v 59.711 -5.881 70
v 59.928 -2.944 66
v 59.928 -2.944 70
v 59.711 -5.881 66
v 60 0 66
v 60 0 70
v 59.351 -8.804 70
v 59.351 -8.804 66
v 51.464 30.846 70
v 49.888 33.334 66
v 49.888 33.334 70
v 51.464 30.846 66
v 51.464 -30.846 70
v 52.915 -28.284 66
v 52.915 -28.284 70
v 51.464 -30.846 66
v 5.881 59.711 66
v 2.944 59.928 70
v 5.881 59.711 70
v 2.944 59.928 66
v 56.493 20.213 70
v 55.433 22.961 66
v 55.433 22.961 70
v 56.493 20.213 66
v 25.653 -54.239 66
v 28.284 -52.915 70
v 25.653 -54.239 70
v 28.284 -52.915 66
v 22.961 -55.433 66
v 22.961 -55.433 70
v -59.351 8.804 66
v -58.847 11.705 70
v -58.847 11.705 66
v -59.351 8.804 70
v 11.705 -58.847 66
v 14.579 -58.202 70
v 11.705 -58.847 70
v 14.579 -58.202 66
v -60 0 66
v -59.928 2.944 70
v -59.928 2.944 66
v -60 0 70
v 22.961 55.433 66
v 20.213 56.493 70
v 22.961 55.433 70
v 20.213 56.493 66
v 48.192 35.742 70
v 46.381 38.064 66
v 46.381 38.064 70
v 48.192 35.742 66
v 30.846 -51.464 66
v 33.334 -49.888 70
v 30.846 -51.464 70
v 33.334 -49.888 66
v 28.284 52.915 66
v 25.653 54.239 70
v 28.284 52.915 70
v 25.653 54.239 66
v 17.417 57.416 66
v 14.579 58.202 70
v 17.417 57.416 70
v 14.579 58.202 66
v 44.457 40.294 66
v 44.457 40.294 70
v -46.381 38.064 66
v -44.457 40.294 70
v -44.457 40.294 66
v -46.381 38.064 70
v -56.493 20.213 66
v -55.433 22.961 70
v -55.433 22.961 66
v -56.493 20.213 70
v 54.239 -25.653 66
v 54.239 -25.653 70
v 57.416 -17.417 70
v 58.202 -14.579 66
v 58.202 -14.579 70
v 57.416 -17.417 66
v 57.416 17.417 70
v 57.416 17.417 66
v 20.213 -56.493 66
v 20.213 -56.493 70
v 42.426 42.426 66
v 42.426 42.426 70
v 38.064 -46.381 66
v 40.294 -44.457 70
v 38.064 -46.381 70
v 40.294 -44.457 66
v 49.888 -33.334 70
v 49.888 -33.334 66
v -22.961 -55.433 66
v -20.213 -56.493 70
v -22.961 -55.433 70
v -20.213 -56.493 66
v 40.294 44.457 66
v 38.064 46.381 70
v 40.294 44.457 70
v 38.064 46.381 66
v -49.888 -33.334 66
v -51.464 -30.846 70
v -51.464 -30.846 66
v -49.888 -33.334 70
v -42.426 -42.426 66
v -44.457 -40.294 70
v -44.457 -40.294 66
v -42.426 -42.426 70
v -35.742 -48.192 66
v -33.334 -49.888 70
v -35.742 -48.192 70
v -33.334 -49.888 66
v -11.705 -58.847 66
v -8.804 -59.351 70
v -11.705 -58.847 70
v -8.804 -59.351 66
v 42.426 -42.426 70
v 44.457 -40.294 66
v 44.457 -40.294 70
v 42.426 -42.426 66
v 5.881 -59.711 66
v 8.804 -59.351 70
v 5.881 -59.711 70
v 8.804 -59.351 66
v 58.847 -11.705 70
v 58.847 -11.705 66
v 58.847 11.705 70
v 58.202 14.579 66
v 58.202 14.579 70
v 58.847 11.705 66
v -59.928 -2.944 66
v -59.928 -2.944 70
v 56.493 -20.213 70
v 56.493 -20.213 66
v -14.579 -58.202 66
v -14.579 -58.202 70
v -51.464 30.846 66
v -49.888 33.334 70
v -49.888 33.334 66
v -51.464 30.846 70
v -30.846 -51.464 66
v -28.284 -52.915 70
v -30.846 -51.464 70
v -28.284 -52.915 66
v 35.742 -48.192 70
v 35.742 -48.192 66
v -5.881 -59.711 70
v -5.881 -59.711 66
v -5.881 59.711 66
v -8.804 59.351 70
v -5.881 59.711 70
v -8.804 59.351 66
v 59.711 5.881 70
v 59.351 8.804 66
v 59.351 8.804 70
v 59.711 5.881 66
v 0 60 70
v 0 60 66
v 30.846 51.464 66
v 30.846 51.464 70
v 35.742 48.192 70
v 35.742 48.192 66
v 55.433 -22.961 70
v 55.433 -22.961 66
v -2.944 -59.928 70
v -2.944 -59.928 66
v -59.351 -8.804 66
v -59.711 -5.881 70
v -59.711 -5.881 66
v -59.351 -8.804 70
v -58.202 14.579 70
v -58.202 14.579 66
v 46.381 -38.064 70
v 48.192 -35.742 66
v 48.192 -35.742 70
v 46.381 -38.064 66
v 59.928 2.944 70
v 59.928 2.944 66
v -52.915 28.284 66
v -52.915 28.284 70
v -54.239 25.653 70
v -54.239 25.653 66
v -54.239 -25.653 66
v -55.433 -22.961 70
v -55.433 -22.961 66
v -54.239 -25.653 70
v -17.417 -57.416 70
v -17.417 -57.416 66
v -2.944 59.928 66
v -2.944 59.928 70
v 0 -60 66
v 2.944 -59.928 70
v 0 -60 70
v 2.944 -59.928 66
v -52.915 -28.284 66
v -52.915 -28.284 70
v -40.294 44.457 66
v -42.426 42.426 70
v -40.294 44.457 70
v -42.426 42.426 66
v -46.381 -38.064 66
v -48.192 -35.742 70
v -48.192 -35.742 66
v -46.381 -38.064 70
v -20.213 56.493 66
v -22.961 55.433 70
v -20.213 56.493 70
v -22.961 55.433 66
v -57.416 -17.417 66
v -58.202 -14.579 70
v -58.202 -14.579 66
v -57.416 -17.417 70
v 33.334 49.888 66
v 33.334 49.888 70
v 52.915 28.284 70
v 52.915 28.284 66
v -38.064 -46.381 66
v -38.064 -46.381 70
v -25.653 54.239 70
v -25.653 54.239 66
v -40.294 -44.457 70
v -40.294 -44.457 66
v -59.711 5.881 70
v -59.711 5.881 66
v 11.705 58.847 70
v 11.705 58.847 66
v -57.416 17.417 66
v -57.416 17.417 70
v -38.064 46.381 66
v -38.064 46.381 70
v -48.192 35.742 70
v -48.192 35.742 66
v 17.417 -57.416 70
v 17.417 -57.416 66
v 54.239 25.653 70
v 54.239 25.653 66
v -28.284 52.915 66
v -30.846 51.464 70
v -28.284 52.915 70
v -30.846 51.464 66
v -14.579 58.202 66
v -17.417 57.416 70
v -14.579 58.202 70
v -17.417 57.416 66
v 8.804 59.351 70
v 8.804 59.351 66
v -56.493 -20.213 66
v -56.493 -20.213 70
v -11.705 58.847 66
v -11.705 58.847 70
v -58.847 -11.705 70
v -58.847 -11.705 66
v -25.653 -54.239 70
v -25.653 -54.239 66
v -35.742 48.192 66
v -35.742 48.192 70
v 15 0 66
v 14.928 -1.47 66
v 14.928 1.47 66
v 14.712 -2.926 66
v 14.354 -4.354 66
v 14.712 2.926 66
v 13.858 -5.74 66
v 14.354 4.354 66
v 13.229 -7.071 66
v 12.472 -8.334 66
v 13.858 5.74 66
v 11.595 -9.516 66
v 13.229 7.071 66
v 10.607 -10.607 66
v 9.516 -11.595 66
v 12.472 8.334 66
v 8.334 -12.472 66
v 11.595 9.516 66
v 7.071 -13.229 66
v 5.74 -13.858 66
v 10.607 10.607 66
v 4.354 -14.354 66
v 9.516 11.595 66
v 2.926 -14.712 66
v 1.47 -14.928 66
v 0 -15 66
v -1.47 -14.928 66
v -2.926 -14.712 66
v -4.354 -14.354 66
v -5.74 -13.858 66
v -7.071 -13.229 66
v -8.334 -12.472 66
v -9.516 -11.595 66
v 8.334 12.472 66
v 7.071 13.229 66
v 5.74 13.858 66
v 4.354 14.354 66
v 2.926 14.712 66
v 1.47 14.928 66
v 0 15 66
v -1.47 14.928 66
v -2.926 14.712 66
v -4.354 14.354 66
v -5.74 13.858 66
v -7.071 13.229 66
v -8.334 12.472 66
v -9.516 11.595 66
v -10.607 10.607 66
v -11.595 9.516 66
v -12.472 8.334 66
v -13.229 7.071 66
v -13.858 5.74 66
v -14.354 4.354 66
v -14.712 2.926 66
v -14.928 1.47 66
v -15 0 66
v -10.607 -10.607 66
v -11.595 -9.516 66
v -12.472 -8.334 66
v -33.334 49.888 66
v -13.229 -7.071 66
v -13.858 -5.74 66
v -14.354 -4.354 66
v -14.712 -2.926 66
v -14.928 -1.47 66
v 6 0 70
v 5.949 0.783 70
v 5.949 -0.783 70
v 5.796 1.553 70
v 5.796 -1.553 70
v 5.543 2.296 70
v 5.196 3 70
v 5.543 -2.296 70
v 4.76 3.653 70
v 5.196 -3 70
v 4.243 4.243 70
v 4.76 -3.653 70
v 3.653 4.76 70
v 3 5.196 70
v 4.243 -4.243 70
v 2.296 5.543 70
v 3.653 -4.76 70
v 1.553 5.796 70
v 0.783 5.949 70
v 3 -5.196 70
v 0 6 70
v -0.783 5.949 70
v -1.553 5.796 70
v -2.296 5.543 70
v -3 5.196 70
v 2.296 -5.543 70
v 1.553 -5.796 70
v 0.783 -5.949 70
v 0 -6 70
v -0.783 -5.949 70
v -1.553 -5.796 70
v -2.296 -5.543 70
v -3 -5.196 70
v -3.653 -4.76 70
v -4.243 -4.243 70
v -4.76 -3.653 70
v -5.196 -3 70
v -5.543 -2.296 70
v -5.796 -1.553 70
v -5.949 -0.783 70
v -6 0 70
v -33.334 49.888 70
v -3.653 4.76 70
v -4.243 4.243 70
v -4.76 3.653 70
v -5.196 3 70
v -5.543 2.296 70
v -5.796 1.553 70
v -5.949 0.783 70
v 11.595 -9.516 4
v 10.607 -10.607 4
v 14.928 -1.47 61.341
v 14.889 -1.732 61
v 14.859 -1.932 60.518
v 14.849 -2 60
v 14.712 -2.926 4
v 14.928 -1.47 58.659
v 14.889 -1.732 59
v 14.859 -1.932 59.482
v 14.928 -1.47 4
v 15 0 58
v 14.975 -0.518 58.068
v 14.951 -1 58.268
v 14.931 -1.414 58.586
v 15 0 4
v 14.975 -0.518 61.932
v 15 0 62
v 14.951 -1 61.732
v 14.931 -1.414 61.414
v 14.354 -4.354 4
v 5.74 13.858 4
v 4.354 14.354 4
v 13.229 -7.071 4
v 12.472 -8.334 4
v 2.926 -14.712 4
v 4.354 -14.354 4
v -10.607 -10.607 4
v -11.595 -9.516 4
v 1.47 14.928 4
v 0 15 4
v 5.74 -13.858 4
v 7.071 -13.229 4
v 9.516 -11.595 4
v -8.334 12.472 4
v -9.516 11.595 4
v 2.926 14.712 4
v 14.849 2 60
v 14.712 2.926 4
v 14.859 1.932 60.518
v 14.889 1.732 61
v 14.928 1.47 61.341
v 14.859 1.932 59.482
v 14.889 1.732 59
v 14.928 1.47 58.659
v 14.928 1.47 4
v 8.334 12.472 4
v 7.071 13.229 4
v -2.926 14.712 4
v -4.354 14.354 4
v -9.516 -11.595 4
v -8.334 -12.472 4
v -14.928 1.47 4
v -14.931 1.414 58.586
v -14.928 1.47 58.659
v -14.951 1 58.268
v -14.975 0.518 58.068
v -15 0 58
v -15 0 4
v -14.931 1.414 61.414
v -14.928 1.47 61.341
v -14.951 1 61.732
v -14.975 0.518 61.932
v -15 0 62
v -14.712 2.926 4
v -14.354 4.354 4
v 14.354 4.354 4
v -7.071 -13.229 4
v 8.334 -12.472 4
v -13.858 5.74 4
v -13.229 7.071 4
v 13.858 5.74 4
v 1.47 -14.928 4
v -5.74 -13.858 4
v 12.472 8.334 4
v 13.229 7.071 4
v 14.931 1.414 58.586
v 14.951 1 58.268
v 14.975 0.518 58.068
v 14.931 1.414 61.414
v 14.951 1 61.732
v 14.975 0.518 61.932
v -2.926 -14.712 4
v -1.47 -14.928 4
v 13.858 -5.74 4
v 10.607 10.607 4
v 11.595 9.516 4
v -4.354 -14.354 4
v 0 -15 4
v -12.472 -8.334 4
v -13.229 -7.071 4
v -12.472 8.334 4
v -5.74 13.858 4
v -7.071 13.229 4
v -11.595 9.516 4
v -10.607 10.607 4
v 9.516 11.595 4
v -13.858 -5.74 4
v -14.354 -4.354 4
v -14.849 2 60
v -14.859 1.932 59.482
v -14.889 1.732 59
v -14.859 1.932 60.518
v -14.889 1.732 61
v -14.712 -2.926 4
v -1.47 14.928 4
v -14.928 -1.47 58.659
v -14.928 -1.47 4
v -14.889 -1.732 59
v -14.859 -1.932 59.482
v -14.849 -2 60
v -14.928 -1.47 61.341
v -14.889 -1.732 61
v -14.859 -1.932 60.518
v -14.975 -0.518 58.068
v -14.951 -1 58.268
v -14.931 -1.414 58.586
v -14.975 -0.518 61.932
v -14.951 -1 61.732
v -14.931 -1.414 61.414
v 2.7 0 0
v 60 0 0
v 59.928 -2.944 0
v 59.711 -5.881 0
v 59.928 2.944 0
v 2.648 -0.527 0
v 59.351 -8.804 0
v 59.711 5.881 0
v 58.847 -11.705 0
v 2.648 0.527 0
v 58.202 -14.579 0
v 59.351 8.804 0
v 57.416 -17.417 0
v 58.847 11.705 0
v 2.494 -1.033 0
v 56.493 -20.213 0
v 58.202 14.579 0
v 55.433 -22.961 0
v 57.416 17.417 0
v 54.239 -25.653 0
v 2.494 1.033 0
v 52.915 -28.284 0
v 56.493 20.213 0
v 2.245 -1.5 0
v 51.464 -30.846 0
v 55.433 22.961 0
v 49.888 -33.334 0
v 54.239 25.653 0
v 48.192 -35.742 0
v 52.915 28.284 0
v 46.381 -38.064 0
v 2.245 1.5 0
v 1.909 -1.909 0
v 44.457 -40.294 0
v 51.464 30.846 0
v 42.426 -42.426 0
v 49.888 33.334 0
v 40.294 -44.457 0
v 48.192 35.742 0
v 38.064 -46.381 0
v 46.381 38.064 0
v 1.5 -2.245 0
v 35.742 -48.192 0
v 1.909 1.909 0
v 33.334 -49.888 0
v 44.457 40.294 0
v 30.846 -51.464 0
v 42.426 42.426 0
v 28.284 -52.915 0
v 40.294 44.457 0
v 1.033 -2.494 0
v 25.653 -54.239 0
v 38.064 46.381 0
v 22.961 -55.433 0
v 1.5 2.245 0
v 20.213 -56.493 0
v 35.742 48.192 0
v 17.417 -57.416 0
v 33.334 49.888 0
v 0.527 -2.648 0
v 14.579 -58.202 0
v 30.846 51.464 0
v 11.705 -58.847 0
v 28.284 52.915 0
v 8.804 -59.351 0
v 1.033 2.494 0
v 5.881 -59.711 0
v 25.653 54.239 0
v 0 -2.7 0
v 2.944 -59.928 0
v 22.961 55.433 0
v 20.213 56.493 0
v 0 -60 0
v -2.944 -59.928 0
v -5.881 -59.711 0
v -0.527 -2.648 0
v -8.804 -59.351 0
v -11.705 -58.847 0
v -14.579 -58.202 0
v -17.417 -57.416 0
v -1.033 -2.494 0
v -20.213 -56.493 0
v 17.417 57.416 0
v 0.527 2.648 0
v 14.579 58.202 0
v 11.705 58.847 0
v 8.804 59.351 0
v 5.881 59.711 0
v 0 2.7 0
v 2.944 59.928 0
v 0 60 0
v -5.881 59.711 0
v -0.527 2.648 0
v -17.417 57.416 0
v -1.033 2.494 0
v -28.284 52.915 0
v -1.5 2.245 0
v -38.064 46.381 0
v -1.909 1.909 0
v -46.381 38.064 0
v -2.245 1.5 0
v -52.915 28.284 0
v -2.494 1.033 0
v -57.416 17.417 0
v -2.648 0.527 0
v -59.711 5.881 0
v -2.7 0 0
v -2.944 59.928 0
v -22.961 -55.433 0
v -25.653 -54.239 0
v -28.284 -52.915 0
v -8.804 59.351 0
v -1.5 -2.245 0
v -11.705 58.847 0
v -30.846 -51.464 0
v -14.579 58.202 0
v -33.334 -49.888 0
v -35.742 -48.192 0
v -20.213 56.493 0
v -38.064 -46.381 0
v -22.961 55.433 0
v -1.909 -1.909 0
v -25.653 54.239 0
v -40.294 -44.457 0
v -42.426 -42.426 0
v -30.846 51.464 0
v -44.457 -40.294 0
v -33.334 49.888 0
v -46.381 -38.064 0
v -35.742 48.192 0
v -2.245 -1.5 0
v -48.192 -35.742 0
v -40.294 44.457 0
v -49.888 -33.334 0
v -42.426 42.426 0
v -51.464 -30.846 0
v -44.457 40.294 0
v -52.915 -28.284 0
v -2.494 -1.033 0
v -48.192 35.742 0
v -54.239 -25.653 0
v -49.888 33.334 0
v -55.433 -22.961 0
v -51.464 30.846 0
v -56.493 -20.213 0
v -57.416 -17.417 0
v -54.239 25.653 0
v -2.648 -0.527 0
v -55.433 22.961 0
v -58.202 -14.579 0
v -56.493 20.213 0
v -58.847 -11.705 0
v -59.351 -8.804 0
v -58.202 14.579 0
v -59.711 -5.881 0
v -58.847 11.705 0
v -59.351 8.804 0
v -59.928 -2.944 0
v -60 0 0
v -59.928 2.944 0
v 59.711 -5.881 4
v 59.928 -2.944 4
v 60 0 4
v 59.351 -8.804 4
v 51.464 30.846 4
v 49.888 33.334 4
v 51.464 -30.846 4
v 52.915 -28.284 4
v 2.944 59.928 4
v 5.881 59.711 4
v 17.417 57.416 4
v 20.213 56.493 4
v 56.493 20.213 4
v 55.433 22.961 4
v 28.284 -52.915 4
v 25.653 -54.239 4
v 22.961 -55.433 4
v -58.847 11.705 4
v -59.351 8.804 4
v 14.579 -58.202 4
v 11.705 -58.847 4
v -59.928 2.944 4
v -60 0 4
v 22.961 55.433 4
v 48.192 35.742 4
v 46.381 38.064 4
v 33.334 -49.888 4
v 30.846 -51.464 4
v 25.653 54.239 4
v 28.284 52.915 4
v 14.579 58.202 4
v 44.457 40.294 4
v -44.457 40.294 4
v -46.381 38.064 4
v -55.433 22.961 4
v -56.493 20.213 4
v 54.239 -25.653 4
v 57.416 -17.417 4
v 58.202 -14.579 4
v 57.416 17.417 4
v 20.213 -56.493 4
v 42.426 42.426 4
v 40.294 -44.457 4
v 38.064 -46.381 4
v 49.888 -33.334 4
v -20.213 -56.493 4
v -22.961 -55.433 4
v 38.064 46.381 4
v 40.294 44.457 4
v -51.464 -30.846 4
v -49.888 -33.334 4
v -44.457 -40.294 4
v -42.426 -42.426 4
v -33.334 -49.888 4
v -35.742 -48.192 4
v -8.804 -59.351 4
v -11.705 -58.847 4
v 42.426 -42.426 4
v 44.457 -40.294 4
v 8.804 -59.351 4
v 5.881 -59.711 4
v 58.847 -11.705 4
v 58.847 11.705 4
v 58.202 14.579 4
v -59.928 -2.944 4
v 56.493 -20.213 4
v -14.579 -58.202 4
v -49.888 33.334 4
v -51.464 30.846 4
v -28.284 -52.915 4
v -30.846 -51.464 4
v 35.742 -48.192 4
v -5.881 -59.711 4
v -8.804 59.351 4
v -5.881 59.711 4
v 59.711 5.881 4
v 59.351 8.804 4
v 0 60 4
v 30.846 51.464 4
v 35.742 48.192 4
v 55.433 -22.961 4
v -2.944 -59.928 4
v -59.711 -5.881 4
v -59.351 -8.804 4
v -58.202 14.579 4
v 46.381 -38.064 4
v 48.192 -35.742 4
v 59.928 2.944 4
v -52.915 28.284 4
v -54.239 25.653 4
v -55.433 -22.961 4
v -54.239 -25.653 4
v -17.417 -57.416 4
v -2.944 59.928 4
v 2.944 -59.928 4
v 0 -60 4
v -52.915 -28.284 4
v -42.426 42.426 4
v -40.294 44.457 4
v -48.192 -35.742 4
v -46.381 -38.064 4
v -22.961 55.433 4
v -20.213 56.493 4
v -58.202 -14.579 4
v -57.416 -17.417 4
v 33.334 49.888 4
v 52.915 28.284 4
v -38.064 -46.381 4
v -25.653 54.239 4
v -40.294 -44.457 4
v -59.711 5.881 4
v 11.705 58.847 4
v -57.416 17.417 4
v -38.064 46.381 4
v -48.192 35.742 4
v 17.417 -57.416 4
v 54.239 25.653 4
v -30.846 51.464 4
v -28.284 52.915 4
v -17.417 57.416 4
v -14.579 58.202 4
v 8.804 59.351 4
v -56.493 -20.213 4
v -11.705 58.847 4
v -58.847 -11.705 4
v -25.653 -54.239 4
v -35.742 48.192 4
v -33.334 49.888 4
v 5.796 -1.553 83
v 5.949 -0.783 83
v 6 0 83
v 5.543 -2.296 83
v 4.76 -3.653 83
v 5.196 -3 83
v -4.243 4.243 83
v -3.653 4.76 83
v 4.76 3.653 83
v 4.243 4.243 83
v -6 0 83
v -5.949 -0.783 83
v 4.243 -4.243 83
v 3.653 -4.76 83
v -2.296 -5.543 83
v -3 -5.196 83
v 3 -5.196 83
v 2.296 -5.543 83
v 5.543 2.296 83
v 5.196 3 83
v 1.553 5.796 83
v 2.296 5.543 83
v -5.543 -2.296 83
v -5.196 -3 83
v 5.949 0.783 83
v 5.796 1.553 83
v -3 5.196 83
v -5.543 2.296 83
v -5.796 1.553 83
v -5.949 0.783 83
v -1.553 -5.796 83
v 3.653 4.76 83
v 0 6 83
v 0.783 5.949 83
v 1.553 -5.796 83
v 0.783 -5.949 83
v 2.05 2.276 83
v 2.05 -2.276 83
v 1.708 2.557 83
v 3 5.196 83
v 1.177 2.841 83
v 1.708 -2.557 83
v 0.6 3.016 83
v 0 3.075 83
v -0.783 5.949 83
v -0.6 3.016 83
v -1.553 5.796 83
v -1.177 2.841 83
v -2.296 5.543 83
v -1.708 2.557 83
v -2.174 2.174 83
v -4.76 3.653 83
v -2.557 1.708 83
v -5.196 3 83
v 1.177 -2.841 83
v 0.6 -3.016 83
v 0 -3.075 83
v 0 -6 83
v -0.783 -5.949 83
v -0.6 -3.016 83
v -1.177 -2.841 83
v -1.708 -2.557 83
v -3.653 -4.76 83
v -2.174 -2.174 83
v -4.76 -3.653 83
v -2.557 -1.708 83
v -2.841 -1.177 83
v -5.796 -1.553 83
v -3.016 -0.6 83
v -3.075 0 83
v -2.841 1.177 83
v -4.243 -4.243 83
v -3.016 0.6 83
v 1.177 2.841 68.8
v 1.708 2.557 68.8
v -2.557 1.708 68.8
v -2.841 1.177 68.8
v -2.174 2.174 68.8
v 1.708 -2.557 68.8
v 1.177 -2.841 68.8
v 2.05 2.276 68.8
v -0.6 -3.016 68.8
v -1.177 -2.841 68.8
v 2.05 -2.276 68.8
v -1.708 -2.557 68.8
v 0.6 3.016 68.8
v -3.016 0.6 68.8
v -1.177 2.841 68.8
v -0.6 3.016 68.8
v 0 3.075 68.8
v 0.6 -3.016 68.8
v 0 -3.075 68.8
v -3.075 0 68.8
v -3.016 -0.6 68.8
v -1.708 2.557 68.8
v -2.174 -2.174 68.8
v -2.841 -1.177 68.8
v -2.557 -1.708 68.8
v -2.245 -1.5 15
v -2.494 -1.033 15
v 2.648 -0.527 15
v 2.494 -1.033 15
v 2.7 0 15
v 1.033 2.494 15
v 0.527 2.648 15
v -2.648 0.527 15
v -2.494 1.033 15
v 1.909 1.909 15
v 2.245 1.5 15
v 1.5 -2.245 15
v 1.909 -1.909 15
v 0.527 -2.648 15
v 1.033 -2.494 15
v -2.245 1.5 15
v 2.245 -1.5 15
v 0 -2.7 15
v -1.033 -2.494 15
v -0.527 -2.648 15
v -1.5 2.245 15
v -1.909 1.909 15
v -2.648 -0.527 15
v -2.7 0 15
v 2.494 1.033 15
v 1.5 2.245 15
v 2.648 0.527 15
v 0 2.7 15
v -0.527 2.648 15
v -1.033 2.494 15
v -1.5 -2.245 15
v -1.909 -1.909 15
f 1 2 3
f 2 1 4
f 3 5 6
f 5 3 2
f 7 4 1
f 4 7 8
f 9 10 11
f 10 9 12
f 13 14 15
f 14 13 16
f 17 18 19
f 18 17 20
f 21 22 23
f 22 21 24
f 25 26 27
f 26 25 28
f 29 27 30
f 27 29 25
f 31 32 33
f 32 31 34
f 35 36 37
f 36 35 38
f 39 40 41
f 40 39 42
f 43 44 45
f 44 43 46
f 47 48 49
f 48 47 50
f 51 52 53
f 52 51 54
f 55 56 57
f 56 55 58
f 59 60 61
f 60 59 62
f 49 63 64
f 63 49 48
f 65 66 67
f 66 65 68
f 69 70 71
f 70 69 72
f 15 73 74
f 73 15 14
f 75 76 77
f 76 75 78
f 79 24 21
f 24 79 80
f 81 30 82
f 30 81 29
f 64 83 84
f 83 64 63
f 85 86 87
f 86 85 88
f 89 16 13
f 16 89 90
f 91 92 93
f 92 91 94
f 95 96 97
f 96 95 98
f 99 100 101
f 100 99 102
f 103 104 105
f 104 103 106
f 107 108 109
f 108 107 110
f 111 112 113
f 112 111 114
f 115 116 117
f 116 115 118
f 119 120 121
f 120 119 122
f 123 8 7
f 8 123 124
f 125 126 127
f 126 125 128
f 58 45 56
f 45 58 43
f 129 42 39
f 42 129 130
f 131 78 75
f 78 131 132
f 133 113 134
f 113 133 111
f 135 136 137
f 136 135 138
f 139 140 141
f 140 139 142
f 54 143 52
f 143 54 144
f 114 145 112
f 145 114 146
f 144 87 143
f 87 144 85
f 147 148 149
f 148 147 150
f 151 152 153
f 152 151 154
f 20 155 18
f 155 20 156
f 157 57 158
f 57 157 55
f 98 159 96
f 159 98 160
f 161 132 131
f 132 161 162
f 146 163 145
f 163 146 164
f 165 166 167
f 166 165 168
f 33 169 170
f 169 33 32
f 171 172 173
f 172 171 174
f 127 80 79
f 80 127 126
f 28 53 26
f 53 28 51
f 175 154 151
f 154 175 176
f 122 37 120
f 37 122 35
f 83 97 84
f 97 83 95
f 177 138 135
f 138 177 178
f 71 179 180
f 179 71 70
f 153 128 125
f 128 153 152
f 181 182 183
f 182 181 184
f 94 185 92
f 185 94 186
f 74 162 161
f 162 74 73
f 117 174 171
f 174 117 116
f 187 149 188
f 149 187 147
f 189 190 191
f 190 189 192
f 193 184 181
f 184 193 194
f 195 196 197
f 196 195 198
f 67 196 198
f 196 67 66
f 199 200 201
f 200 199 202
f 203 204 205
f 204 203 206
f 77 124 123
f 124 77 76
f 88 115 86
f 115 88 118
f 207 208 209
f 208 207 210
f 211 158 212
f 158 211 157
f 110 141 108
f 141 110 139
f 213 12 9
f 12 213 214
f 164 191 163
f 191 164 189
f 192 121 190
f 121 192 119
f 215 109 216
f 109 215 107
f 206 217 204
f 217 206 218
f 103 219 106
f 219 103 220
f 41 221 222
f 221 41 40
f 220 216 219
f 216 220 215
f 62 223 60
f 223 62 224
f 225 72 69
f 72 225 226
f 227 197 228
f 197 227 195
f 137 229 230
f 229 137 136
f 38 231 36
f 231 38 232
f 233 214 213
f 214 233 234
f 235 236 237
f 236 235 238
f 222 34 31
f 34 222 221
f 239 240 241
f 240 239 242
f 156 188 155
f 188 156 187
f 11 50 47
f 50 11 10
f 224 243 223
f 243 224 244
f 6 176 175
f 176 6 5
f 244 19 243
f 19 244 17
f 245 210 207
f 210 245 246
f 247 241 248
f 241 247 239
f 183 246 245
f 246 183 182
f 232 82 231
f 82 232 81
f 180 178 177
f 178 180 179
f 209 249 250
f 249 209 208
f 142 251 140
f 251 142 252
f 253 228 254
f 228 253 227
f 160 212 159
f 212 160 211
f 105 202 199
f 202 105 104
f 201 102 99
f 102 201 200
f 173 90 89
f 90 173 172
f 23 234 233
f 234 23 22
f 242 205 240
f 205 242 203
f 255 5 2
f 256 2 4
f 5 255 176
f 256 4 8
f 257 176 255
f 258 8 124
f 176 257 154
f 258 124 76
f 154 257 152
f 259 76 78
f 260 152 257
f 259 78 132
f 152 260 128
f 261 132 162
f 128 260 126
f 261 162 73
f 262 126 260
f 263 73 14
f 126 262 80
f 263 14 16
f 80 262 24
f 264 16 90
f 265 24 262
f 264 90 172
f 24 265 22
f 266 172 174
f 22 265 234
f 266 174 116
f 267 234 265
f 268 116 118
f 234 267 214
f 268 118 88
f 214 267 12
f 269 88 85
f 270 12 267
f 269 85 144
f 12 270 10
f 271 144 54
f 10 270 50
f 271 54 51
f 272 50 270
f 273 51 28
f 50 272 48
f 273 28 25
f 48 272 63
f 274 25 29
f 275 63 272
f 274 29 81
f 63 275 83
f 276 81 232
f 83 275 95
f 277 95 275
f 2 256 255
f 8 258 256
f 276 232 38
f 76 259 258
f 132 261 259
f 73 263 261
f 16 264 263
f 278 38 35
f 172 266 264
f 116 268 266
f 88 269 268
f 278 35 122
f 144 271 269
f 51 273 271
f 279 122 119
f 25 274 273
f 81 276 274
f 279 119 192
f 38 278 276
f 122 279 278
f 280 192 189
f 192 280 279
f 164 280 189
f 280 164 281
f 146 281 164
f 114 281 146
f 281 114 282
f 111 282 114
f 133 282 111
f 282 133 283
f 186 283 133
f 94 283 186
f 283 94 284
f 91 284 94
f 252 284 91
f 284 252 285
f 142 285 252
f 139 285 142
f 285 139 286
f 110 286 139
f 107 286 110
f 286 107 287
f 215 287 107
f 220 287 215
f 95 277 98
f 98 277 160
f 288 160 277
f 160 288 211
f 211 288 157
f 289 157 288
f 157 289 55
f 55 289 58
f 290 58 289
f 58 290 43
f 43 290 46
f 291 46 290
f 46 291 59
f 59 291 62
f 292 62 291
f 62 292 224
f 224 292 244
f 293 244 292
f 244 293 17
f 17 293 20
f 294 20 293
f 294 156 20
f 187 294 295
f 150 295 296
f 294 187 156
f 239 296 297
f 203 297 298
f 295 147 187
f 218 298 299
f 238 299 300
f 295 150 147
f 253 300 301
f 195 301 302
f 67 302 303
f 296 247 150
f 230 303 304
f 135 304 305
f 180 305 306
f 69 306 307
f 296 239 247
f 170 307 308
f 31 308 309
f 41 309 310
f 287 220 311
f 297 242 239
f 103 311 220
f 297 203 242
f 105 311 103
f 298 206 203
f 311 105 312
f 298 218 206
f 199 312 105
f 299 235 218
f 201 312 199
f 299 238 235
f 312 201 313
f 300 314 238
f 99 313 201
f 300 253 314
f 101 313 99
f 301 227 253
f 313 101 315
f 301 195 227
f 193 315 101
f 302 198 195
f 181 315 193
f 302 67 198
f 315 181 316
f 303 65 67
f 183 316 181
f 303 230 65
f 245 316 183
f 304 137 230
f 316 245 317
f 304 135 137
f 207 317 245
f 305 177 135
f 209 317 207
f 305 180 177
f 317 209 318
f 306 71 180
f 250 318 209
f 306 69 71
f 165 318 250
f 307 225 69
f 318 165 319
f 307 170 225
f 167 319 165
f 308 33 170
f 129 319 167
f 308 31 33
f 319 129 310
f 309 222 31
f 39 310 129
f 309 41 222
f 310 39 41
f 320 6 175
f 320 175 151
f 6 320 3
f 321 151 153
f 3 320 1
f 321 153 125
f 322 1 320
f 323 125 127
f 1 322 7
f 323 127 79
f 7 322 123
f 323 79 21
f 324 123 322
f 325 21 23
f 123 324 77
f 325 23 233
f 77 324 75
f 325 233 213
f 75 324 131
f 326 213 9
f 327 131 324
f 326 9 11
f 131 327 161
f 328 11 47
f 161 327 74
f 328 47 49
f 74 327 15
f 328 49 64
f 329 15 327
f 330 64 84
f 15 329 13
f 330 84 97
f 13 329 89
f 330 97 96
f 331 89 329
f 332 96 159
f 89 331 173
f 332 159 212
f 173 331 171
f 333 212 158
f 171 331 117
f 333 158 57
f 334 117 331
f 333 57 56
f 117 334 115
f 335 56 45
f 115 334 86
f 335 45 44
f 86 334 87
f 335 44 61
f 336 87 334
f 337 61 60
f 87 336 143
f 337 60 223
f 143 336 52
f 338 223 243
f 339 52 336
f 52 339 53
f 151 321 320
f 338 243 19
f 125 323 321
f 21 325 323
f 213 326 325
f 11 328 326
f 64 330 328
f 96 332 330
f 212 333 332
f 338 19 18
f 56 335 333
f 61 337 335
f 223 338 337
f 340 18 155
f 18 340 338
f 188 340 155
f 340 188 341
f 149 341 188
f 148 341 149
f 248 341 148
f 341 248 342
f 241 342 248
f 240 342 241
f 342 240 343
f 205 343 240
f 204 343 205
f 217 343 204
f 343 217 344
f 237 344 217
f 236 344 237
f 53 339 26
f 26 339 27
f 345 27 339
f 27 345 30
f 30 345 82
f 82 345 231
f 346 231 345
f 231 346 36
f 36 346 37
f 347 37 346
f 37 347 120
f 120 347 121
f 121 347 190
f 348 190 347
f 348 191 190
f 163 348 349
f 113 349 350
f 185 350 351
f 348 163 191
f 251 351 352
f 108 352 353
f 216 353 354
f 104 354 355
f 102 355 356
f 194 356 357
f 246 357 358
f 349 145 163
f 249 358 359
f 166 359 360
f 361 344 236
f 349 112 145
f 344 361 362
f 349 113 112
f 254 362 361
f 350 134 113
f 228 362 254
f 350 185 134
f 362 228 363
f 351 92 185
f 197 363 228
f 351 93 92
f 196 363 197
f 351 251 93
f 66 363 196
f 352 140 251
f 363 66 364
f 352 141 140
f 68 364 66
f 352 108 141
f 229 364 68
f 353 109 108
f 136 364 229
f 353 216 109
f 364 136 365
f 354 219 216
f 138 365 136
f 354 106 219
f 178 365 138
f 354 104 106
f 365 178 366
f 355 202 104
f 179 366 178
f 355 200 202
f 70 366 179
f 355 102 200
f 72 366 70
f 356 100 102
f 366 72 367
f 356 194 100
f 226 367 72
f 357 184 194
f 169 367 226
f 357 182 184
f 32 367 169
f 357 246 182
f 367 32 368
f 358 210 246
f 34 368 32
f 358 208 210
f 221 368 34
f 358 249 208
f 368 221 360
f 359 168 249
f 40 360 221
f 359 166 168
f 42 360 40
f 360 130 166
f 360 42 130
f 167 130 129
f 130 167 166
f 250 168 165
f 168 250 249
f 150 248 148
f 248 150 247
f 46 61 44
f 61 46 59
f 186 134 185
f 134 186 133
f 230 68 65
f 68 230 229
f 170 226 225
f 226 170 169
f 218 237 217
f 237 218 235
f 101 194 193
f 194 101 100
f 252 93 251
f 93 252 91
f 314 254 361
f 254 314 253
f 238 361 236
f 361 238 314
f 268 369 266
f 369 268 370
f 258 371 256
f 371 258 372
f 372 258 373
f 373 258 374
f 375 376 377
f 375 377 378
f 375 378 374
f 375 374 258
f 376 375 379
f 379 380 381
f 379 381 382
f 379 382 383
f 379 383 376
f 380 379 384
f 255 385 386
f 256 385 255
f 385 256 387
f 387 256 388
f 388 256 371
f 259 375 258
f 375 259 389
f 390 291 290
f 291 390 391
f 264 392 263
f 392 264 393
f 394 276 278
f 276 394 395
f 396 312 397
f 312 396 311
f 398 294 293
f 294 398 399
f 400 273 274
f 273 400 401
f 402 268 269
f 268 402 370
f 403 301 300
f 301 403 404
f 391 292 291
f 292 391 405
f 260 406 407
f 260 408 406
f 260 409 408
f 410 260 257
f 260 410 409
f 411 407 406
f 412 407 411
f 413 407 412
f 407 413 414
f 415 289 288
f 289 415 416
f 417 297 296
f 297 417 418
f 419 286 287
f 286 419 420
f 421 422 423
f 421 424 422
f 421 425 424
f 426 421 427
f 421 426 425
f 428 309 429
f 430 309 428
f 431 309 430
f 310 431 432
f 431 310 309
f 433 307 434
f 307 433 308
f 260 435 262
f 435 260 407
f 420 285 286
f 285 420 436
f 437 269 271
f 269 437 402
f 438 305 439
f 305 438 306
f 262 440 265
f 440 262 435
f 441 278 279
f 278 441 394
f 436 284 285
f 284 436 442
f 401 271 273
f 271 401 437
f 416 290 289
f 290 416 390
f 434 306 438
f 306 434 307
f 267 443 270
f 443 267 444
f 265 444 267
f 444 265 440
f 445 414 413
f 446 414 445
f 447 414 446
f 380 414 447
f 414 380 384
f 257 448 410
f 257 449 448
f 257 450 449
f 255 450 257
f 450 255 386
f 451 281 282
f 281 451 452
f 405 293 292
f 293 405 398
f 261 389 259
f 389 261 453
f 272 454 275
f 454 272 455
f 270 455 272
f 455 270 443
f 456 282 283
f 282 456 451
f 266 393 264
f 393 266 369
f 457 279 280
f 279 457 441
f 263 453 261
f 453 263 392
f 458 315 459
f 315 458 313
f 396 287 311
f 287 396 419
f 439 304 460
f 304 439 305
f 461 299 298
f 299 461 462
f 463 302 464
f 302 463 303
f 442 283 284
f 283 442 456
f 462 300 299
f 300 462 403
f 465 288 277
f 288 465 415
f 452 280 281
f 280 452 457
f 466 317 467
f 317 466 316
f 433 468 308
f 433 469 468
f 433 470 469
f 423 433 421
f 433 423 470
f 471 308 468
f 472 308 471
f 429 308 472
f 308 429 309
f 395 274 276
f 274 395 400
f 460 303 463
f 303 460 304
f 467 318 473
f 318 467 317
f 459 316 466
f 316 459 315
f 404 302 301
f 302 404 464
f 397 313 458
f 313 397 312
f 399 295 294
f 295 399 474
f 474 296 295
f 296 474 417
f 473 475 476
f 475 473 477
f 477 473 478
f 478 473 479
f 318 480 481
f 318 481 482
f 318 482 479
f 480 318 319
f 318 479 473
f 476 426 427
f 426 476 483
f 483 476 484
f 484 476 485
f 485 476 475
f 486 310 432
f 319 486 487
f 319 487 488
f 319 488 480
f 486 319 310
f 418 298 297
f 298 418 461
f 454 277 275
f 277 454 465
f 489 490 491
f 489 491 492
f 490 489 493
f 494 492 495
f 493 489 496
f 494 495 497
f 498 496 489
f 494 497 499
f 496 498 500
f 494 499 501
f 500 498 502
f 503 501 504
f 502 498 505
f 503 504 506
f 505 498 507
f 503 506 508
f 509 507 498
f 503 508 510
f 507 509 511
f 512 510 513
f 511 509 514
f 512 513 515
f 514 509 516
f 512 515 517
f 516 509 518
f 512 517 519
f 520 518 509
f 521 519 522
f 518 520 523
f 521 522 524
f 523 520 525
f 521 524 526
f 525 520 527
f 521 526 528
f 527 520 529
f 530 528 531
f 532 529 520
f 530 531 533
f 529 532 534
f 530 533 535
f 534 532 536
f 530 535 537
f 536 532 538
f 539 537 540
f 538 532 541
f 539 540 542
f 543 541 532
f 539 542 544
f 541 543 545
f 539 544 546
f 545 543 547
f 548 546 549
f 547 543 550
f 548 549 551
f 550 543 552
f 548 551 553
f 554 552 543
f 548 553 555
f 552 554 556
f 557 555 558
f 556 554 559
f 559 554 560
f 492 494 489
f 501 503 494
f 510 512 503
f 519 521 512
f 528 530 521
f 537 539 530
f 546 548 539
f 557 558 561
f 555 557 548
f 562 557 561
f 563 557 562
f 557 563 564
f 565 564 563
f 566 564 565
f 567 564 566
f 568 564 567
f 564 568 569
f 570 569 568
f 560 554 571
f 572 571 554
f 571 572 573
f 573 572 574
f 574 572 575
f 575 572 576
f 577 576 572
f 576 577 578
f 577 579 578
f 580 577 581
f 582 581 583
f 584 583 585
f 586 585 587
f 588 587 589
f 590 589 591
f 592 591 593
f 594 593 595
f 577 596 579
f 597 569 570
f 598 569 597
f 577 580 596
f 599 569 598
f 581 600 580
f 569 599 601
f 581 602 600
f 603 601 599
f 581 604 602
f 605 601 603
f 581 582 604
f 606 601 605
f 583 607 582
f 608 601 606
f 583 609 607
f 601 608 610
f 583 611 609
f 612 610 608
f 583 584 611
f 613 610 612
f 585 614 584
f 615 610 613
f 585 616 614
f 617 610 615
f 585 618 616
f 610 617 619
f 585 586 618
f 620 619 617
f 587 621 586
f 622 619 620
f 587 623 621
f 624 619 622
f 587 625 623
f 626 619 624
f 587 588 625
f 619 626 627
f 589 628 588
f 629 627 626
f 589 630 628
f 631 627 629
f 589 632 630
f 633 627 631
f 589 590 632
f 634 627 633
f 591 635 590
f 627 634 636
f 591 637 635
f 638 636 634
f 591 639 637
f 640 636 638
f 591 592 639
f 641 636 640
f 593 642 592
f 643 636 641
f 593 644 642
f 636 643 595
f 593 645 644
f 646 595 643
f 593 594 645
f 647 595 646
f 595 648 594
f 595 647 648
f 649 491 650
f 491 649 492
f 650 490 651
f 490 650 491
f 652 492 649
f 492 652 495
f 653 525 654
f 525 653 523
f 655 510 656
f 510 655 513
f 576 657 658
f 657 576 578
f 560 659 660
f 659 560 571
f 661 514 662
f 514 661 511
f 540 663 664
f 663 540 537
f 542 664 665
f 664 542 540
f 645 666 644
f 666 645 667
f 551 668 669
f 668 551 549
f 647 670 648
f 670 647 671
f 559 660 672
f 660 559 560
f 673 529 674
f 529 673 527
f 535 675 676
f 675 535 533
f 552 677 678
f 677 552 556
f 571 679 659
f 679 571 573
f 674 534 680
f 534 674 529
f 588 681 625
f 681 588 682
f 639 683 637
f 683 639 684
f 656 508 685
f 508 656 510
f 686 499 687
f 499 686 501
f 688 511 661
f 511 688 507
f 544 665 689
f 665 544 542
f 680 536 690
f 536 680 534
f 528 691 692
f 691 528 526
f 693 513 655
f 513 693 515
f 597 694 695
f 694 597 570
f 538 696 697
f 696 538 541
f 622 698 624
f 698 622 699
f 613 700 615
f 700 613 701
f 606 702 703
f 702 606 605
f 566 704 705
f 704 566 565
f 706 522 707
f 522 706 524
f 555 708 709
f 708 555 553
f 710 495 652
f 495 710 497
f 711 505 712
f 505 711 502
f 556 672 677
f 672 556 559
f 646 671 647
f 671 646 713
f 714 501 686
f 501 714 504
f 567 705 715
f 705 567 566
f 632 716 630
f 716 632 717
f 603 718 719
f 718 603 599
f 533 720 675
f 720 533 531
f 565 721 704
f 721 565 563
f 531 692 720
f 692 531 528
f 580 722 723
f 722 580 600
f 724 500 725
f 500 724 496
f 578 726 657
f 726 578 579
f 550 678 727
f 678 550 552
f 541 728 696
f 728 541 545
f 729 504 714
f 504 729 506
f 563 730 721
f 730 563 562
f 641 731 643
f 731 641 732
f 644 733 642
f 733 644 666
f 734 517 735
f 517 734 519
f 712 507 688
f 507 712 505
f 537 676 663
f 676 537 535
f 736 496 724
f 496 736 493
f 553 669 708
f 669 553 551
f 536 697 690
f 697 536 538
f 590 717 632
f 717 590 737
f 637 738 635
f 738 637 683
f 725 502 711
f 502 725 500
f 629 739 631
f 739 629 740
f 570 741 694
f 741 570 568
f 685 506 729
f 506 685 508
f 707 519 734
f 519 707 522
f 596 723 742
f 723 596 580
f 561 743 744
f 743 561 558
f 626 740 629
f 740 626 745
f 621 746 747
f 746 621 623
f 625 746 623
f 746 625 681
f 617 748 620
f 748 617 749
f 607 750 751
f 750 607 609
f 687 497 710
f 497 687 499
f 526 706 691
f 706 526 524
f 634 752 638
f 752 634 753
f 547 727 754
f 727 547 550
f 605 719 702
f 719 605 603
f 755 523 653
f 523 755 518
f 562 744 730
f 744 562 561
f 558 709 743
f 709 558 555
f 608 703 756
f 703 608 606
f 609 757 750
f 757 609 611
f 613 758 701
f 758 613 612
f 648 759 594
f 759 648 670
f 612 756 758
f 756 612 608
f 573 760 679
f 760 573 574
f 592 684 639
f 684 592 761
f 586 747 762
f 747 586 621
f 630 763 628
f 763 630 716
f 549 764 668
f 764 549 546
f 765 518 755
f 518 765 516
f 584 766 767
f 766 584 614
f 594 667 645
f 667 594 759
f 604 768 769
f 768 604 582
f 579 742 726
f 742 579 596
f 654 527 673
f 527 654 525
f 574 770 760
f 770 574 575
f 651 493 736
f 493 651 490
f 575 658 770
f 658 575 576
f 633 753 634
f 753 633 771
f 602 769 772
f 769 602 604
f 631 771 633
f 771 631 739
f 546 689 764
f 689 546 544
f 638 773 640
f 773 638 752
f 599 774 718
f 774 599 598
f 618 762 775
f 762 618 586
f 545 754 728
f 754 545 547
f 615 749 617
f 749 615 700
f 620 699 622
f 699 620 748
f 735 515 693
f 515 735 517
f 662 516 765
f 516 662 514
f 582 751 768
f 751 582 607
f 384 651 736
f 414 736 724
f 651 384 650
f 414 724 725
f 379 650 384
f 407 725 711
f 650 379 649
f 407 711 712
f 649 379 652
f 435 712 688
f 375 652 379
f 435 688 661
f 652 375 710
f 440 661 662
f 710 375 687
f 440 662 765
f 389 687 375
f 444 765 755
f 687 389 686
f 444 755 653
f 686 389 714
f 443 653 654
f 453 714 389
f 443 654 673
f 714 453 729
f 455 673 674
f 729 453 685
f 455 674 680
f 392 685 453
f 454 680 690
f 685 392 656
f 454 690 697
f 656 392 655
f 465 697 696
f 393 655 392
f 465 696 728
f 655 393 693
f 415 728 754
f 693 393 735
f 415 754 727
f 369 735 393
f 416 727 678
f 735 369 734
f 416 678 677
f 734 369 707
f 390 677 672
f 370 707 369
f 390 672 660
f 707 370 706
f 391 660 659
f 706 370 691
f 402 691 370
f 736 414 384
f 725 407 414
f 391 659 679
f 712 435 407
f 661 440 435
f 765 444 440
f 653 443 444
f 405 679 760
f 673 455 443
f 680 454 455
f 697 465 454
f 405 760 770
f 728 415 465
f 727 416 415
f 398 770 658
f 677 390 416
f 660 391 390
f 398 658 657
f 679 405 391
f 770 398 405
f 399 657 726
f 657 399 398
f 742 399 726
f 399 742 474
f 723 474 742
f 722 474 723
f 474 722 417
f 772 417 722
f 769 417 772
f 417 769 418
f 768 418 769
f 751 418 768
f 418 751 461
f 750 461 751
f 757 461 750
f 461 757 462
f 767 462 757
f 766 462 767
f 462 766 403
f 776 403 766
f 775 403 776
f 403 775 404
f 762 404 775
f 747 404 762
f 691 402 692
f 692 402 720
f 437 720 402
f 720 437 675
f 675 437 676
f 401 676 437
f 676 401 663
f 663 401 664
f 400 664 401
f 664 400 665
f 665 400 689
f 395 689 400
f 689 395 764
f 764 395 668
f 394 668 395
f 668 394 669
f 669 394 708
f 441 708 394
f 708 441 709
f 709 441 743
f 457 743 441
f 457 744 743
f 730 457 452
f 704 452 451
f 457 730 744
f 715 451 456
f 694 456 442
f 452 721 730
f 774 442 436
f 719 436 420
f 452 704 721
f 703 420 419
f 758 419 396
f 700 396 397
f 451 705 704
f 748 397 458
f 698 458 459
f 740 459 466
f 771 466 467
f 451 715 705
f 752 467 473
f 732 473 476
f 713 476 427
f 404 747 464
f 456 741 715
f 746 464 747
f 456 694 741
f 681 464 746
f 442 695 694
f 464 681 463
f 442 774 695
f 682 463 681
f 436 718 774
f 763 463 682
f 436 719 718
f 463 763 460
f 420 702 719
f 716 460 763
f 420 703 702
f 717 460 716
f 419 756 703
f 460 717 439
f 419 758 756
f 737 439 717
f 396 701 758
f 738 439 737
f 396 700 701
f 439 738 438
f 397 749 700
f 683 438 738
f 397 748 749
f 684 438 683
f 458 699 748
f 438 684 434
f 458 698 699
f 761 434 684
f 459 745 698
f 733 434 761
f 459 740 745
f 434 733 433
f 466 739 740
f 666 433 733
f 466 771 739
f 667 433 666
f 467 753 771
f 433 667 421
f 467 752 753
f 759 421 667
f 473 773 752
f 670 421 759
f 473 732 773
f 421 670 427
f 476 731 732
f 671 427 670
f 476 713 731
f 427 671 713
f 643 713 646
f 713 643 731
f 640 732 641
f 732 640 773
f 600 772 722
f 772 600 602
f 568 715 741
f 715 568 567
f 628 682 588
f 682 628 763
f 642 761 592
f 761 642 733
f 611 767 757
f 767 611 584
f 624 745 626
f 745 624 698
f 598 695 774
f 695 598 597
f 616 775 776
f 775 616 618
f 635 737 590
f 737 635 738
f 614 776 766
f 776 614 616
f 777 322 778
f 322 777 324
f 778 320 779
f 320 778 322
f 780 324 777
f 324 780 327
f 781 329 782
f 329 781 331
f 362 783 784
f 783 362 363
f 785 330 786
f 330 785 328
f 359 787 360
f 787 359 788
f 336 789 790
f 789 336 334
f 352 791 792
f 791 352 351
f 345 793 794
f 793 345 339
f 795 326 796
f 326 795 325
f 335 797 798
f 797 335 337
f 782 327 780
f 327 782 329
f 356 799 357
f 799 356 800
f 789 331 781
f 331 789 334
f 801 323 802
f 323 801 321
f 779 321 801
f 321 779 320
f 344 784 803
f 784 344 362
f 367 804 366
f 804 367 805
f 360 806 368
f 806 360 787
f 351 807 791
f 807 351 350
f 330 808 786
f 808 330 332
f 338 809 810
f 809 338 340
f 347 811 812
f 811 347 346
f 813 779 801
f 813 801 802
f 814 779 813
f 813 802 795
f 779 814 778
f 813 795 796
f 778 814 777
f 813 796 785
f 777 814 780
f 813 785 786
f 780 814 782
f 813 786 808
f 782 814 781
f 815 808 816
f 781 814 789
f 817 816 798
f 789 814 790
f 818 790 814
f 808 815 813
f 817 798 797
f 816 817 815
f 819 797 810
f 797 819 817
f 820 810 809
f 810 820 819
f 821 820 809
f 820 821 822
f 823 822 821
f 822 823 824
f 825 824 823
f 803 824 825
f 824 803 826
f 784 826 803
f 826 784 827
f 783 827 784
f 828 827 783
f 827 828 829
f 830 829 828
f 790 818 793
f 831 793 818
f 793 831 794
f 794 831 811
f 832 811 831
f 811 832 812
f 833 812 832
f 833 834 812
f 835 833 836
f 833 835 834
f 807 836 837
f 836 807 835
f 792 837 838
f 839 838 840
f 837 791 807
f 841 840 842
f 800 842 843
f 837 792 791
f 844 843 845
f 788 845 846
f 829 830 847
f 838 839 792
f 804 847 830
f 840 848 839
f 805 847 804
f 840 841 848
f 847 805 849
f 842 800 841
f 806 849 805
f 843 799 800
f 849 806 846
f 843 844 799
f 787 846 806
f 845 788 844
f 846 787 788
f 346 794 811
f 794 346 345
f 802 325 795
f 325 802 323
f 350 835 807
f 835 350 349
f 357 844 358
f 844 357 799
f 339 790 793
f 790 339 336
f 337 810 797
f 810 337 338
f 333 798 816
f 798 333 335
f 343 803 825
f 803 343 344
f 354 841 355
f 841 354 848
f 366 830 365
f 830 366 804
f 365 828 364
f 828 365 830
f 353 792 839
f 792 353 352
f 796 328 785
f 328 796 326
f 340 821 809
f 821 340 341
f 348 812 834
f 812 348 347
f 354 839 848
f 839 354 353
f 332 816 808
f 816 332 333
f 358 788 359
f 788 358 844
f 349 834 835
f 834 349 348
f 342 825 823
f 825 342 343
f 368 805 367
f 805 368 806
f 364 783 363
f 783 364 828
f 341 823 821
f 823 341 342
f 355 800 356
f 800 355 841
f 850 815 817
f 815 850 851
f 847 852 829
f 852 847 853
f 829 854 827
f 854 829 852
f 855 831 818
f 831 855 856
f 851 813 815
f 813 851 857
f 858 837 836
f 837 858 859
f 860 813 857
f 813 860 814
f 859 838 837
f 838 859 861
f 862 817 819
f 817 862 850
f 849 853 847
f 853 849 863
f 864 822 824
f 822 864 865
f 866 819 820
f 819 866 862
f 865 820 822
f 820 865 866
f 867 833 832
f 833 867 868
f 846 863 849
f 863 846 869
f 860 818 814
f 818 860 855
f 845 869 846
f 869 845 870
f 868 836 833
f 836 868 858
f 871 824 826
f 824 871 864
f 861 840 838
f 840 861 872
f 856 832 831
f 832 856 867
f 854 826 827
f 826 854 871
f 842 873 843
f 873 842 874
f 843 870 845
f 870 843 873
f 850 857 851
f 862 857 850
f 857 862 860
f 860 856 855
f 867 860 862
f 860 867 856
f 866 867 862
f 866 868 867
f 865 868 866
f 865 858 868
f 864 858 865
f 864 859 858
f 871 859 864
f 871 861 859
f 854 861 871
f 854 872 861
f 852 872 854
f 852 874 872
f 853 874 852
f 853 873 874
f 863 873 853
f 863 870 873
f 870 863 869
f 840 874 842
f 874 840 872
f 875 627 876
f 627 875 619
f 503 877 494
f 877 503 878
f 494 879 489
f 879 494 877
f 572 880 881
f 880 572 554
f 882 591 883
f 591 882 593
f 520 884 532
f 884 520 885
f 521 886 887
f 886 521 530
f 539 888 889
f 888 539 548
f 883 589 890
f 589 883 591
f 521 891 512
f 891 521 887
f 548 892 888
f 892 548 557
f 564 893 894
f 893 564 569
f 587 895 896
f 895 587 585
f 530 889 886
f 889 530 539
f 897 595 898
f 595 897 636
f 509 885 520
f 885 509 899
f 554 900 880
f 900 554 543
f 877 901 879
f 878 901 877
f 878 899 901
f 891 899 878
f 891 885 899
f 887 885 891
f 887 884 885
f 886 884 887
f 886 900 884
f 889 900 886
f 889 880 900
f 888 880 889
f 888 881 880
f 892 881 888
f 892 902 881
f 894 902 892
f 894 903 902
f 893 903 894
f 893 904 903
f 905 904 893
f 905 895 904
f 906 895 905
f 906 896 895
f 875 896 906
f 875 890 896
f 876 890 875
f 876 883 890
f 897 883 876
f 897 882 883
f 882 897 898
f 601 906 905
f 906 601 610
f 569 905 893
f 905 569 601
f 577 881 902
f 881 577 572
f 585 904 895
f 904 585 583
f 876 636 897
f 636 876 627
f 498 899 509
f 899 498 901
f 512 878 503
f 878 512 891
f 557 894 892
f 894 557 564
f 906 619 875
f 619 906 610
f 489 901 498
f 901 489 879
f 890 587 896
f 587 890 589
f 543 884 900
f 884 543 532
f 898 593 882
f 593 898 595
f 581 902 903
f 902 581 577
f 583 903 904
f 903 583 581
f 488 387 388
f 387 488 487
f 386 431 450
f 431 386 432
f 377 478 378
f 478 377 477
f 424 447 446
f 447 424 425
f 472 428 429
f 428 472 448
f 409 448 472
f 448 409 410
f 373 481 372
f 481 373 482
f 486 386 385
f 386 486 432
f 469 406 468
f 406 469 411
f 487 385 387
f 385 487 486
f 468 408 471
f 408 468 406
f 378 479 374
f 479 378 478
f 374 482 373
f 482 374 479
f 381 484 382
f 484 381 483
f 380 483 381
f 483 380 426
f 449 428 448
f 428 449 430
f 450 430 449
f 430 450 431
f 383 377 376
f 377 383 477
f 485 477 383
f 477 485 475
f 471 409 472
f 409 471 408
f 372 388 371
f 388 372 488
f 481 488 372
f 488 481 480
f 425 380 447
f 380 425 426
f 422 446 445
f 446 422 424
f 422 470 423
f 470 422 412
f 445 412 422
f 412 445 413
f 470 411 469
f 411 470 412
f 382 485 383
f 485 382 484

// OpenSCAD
include <../lib/meshtastic-drybag-node-lib.scad>;
$fn = 40;
spool_print();
